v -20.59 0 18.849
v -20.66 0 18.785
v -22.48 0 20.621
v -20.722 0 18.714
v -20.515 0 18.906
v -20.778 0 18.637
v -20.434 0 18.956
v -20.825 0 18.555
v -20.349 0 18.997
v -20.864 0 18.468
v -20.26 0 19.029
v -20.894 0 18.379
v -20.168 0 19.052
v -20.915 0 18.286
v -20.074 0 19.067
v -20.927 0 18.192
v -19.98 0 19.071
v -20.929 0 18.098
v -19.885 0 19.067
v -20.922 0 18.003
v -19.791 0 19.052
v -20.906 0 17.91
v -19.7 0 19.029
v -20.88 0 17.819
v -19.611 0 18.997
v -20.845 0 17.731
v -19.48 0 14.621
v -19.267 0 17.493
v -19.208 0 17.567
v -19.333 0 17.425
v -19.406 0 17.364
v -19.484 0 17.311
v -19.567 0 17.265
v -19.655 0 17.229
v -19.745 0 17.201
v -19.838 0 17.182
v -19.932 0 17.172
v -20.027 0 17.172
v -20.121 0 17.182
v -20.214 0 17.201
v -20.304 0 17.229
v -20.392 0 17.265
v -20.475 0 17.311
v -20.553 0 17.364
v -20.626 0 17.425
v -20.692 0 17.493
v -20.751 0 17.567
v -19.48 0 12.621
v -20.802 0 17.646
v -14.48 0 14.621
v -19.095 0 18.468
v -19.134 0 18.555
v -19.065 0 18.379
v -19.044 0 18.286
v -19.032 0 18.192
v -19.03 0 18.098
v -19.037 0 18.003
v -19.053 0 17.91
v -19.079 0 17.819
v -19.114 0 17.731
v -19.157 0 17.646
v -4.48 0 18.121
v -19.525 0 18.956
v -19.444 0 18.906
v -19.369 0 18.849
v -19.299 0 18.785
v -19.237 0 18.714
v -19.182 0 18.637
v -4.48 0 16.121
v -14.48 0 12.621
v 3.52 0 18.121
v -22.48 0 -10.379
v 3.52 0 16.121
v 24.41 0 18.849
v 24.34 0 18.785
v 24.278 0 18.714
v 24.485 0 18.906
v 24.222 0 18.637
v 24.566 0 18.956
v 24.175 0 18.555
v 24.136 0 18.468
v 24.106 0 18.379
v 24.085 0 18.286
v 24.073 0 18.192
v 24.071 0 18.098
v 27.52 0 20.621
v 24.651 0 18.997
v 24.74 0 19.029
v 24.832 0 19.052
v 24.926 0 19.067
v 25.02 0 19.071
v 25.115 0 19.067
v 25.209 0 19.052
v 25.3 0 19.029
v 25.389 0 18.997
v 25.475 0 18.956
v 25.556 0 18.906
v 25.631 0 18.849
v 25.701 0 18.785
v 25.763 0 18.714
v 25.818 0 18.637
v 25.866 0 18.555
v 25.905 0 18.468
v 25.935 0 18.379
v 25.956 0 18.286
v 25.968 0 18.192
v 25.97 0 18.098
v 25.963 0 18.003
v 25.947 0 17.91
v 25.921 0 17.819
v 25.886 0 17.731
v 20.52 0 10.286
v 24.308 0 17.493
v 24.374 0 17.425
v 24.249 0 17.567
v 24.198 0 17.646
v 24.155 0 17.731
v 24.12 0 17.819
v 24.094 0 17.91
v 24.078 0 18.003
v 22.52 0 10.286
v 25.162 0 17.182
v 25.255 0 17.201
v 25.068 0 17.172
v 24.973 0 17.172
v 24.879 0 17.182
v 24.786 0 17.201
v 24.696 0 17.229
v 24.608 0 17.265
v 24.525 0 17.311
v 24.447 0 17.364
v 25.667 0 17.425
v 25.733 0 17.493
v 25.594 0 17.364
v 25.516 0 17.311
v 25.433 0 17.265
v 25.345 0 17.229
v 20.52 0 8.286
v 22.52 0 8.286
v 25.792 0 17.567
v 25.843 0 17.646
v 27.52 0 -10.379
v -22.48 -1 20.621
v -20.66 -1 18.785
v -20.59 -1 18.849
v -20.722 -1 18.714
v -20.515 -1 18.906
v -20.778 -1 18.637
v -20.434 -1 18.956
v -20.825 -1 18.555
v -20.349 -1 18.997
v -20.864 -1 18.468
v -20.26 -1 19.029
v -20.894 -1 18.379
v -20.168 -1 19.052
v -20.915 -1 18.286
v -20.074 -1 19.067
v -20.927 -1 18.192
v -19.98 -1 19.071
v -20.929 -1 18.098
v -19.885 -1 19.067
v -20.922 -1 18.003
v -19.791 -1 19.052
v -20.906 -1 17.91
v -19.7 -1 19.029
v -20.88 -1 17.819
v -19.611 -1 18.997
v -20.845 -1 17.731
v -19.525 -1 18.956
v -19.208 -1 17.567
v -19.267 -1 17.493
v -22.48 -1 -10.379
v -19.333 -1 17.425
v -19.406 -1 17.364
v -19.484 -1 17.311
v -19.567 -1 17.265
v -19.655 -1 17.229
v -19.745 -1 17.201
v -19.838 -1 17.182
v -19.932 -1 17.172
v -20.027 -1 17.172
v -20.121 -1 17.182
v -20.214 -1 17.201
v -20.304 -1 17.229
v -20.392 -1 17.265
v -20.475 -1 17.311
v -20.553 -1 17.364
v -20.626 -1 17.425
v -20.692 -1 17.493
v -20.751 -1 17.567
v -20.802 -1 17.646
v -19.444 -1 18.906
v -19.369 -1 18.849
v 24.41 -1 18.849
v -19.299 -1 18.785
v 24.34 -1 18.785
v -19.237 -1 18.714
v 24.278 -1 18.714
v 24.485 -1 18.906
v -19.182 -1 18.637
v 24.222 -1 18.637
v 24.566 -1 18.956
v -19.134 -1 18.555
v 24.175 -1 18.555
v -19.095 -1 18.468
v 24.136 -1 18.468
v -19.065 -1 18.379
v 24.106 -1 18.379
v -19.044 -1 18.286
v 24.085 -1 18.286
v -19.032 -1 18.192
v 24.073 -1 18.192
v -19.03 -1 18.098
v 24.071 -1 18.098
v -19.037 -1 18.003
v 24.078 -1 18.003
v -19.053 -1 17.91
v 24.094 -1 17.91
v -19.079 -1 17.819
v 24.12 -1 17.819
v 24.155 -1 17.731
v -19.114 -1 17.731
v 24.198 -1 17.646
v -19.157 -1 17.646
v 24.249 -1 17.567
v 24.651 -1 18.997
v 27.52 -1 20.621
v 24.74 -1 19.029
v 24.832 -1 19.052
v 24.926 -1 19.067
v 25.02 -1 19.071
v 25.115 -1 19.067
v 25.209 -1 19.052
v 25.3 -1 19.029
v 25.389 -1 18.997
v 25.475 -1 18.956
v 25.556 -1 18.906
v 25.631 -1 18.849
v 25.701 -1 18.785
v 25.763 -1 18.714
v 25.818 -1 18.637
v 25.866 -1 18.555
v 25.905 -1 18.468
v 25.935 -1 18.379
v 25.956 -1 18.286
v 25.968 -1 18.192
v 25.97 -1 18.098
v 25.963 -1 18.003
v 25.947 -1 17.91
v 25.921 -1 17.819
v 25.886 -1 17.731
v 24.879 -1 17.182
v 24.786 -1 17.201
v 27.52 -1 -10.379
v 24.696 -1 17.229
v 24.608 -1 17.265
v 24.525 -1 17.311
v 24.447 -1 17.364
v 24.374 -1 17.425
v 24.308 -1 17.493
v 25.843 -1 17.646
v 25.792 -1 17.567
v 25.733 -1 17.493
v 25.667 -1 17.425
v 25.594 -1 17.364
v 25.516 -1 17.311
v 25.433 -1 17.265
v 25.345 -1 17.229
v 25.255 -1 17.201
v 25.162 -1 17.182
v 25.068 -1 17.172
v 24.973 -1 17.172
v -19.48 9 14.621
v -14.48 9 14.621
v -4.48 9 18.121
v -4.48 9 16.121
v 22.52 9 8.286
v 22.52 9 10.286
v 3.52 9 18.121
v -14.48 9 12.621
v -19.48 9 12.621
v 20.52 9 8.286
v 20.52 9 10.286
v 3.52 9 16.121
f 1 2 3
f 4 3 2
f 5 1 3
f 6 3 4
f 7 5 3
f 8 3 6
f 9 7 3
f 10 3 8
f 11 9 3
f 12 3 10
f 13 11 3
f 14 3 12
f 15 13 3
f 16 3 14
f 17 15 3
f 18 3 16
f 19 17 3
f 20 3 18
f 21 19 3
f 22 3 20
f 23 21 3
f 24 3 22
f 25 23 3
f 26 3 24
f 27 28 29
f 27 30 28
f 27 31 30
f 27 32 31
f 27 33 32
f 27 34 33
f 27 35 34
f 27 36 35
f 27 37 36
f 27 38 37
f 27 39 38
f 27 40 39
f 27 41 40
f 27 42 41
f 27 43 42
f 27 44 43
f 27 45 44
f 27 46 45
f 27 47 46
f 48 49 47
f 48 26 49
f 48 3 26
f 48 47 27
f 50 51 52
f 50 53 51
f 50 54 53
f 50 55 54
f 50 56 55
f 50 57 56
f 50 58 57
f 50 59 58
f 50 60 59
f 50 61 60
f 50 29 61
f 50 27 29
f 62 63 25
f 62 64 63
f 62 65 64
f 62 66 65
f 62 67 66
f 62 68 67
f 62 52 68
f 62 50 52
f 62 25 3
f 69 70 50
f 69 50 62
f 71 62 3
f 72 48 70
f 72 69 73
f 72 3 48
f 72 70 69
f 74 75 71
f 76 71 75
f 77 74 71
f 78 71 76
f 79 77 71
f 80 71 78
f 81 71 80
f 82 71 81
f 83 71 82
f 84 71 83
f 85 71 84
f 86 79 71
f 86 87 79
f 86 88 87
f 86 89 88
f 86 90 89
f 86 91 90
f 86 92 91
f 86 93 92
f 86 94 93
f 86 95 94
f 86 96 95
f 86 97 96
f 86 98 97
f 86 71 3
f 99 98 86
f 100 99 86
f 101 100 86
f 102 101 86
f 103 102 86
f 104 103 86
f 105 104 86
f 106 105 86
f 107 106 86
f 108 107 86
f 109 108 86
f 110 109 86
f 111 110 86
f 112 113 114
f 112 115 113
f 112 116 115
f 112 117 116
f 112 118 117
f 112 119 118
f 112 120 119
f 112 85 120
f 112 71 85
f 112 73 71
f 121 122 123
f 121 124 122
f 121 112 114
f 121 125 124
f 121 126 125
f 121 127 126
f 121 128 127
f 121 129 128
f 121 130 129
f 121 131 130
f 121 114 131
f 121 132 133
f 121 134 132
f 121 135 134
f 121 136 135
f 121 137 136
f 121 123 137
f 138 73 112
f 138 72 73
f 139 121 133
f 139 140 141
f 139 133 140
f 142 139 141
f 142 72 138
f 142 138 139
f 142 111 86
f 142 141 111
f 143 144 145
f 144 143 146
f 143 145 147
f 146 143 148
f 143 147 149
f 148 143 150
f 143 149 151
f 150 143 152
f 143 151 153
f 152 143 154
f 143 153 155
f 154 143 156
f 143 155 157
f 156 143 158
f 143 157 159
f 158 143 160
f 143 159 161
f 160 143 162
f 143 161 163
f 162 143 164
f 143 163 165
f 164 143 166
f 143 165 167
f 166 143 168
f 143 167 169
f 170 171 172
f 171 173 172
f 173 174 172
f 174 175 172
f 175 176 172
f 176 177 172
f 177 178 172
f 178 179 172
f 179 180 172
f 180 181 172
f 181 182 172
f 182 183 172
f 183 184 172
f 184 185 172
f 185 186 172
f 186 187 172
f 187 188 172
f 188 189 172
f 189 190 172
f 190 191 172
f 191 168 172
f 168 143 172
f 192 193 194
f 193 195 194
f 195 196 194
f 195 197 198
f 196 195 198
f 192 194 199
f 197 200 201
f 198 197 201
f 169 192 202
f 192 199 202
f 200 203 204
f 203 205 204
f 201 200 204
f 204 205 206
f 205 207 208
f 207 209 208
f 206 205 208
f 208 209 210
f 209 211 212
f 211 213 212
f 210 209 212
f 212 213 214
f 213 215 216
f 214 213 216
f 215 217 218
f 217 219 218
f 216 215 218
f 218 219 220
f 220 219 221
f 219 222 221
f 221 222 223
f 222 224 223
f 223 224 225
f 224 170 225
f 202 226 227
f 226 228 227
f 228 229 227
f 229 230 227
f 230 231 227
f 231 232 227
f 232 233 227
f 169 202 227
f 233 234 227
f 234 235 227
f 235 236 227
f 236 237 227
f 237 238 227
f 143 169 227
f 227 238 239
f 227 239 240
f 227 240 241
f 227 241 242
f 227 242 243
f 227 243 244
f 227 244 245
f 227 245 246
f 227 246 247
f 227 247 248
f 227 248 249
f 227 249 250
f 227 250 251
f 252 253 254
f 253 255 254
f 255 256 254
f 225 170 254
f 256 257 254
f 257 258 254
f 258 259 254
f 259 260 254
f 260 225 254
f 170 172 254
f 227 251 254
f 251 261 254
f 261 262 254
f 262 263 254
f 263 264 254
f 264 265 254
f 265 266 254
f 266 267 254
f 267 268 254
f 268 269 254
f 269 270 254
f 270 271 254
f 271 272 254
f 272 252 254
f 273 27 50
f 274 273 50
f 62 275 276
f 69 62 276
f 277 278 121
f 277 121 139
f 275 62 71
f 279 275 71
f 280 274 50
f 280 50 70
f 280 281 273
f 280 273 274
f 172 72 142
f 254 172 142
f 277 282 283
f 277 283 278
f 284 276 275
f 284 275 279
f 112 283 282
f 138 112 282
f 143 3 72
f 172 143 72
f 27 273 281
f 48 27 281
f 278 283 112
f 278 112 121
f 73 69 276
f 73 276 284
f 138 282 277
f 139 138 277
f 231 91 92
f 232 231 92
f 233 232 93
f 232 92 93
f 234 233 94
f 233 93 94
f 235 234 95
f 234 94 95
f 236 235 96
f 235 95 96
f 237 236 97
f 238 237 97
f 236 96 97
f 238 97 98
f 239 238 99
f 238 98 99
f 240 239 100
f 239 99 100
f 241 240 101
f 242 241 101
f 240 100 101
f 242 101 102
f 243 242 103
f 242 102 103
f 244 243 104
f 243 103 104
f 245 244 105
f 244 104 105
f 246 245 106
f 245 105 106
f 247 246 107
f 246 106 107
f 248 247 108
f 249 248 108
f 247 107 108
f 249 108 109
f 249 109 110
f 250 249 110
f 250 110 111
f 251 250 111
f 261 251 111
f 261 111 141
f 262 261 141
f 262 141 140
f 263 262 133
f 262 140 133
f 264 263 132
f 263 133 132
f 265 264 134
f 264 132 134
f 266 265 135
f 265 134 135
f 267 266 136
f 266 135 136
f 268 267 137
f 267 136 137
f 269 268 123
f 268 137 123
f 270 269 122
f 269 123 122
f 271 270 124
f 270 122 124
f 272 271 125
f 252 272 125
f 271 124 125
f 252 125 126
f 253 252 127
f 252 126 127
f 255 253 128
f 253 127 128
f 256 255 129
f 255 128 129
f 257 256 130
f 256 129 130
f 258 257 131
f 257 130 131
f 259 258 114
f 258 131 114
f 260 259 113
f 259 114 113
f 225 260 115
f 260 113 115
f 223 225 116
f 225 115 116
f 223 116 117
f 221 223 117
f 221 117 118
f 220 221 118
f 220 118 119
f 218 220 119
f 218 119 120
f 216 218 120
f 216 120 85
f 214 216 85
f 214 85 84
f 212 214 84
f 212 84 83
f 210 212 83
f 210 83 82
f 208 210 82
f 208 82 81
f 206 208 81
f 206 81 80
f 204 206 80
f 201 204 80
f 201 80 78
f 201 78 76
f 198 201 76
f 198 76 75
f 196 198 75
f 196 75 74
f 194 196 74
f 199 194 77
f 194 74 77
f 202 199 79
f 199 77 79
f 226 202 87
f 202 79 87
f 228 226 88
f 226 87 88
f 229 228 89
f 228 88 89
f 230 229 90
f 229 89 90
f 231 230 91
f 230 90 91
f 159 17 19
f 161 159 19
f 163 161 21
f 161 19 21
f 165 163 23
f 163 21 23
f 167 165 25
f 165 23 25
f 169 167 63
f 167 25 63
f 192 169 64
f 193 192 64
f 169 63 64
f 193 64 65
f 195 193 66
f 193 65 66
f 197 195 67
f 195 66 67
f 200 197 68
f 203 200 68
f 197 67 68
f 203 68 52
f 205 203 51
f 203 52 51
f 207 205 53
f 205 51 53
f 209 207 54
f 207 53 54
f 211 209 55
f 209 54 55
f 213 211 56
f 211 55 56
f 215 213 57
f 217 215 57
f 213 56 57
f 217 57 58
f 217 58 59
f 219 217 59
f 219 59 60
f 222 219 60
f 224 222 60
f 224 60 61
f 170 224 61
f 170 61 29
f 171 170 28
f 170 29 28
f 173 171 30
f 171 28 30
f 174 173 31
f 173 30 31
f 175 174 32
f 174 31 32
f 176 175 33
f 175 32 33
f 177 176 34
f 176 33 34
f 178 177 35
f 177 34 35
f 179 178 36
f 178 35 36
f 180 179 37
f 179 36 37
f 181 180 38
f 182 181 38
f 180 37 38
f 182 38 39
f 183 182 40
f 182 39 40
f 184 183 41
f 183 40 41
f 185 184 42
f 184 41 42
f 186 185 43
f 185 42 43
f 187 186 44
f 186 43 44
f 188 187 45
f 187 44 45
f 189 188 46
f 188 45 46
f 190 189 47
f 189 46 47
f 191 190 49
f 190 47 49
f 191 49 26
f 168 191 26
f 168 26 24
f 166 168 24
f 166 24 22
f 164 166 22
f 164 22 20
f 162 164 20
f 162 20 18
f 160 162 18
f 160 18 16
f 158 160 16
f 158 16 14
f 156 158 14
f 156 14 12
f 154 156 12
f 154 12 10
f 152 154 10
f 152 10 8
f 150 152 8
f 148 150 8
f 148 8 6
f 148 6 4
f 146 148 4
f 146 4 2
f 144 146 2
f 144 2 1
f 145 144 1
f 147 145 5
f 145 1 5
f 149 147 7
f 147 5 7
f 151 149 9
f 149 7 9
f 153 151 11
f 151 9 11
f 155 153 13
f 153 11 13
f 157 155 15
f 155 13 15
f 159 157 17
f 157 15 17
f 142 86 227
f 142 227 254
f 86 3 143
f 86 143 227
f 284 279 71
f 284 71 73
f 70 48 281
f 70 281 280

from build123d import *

# Parameters (mm, degrees)
BOSS_EXTRU_7_DEPTH      = 9
BOSS_EXTRU_7_DEPTH_BACK = 1
ESQUISSE1_W             = 8
ESQUISSE1_H             = 2
BOSS_EXTRU_8_DEPTH      = 9
BOSS_EXTRU_8_DEPTH_BACK = 1
ESQUISSE1_10_W          = 5
ESQUISSE1_10_H          = 2
BOSS_EXTRU_9_DEPTH      = 9
BOSS_EXTRU_9_DEPTH_BACK = 1
ESQUISSE1_11_W          = 2
ESQUISSE1_11_H          = 2
ESQUISSE1_12_W          = 50
ESQUISSE1_12_H          = 31
ESQUISSE1_12_R          = 0.95
ESQUISSE1_12_W_2        = 5
ESQUISSE1_12_H_2        = 2
ESQUISSE1_12_W_3        = 8
ESQUISSE1_12_W_4        = 2
BOSS_EXTRU_10_DEPTH     = 1


with BuildPart() as part:
    # Esquisse1 → Boss.-Extru.7 (new, two sides: drawn at the far end of the back side and taken through both)
    with BuildSketch(Plane(origin=(0, 0, 0), x_dir=(1, 0, 0), z_dir=(0, 1, 0)).offset(-BOSS_EXTRU_7_DEPTH_BACK)):
        with Locations((-0.479564033, -17.121253406)):
            Rectangle(ESQUISSE1_W, ESQUISSE1_H)
    extrude(amount=BOSS_EXTRU_7_DEPTH + BOSS_EXTRU_7_DEPTH_BACK)



with BuildPart() as body_2:
    # Esquisse1<10> → Boss.-Extru.8 (new, two sides: drawn at the far end of the back side and taken through both)
    with BuildSketch(Plane(origin=(0, 0, 0), x_dir=(1, 0, 0), z_dir=(0, 1, 0)).offset(-BOSS_EXTRU_8_DEPTH_BACK)):
        with Locations((-16.979564033, -13.621253406)):
            Rectangle(ESQUISSE1_10_W, ESQUISSE1_10_H)
    extrude(amount=BOSS_EXTRU_8_DEPTH + BOSS_EXTRU_8_DEPTH_BACK)


with BuildPart() as body_3:
    # Esquisse1<11> → Boss.-Extru.9 (new, two sides: drawn at the far end of the back side and taken through both)
    with BuildSketch(Plane(origin=(0, 0, 0), x_dir=(1, 0, 0), z_dir=(0, 1, 0)).offset(-BOSS_EXTRU_9_DEPTH_BACK)):
        with Locations((21.520435967, -9.286103542)):
            Rectangle(ESQUISSE1_11_W, ESQUISSE1_11_H)
    extrude(amount=BOSS_EXTRU_9_DEPTH + BOSS_EXTRU_9_DEPTH_BACK)


with BuildPart() as part_1:
    add(part.part)

    add(body_2.part)  # Boss.-Extru.10 merges body 2

    add(body_3.part)  # Boss.-Extru.10 merges body 3
    # Esquisse1<12> → Boss.-Extru.10 (add)
    with BuildSketch(Plane(origin=(0, 0, 0), x_dir=(1, 0, 0), z_dir=(0, 1, 0))):
        with Locations((2.520435967, -5.121253406)):
            Rectangle(ESQUISSE1_12_W, ESQUISSE1_12_H)
        with Locations((-19.979564033, -18.121253406)):
            Circle(ESQUISSE1_12_R, mode=Mode.SUBTRACT)
        with Locations((25.020435967, -18.121253406)):
            Circle(ESQUISSE1_12_R, mode=Mode.SUBTRACT)
        with Locations((-16.979564033, -13.621253406)):
            Rectangle(ESQUISSE1_12_W_2, ESQUISSE1_12_H_2, mode=Mode.SUBTRACT)
        with Locations((-0.479564033, -17.121253406)):
            Rectangle(ESQUISSE1_12_W_3, ESQUISSE1_12_H_2, mode=Mode.SUBTRACT)
        with Locations((21.520435967, -9.286103542)):
            Rectangle(ESQUISSE1_12_W_4, ESQUISSE1_12_H_2, mode=Mode.SUBTRACT)
    extrude(amount=-BOSS_EXTRU_10_DEPTH)


solid = part_1.part
